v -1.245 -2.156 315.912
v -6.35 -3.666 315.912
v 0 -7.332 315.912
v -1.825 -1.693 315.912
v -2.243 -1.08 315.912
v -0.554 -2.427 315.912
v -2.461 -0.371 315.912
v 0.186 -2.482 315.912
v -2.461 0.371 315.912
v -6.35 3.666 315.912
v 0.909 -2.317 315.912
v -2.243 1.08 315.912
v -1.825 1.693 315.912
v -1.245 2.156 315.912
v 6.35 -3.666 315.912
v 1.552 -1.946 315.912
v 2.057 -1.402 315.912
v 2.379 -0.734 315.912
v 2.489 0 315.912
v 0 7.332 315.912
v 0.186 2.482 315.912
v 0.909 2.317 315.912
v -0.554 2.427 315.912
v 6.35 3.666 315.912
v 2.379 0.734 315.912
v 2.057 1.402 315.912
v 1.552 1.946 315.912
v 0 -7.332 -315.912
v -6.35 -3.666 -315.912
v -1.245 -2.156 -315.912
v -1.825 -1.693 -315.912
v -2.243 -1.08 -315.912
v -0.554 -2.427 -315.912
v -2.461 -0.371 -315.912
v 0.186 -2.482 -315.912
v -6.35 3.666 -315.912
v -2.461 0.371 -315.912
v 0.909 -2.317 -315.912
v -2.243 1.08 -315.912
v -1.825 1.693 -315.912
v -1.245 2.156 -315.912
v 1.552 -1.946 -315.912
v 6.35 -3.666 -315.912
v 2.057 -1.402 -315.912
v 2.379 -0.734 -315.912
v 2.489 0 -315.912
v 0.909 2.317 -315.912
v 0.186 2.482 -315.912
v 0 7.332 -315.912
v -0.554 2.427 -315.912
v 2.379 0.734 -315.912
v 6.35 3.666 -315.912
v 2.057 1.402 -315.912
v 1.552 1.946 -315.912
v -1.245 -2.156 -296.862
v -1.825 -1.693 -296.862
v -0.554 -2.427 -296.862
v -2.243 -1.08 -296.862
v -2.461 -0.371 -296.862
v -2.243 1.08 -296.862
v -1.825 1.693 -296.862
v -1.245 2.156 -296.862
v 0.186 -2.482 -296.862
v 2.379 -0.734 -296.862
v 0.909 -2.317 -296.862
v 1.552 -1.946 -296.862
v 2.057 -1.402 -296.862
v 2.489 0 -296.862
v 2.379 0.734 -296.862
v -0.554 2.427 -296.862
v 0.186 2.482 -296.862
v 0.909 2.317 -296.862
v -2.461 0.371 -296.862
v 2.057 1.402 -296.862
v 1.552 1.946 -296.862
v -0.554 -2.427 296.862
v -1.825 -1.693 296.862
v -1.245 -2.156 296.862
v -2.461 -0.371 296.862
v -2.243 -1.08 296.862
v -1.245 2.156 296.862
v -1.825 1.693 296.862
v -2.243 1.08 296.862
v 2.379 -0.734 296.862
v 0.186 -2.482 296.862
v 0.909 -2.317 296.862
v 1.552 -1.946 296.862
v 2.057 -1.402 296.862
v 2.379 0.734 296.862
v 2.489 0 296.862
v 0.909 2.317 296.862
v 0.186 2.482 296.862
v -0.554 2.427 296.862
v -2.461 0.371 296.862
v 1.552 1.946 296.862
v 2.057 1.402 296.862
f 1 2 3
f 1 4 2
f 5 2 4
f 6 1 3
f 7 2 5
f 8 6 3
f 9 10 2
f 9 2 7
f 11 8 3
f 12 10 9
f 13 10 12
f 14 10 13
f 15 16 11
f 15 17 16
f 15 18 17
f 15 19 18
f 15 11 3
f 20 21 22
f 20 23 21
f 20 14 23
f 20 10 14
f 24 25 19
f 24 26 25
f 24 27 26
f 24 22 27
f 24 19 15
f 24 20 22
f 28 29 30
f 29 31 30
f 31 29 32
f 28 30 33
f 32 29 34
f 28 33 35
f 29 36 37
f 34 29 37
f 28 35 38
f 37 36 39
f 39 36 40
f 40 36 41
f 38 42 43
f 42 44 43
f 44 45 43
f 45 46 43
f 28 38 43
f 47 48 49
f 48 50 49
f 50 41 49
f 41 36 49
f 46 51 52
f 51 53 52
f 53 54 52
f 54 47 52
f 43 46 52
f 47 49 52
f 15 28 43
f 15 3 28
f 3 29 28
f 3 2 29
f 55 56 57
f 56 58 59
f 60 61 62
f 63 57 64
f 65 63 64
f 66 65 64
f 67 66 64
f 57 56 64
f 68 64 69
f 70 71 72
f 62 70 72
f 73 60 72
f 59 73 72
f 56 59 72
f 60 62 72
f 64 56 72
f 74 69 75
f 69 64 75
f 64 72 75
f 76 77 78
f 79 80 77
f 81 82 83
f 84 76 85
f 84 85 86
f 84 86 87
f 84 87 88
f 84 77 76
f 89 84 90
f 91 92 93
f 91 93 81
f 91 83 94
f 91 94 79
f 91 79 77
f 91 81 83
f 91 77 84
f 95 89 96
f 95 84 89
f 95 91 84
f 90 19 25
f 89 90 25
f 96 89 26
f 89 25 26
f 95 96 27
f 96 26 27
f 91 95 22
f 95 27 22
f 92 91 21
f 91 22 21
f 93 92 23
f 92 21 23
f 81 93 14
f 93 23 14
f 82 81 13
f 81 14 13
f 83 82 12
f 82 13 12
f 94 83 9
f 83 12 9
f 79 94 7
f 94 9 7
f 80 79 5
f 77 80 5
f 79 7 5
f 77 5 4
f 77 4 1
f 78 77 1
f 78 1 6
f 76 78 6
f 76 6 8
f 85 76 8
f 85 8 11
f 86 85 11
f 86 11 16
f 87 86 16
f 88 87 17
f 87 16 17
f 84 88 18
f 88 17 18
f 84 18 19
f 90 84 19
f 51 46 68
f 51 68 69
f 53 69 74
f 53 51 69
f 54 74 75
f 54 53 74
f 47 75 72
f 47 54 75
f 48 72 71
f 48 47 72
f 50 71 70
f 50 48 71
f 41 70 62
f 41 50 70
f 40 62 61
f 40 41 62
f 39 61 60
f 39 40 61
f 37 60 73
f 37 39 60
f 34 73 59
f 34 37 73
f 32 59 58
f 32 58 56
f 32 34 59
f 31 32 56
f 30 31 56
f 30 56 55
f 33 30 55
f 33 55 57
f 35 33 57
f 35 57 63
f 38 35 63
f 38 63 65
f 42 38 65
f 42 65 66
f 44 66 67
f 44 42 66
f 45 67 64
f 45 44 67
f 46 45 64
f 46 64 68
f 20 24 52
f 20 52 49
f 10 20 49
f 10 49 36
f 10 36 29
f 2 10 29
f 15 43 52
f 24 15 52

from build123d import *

# Parameters (mm, degrees)
BOSS_EXTRUDE1_DEPTH = 315.9125
SKETCH2_R           = 2.4892
CUT_EXTRUDE1_DEPTH  = 19.05


with BuildPart() as part:
    # Sketch1 → Boss-Extrude1 (new, symmetric)
    with BuildSketch(Plane.XY):
        Polygon((6.35, -3.666174209), (6.35, 3.666174209), (0, 7.332348419), (-6.35, 3.666174209), (-6.35, -3.666174209), (0, -7.332348419), align=None)
    extrude(amount=BOSS_EXTRUDE1_DEPTH, both=True)

    # Sketch2 → Cut-Extrude1 (cut)
    with BuildSketch(Plane.XY.offset(315.9125)):
        Circle(SKETCH2_R)
    cut_extrude1 = extrude(amount=-CUT_EXTRUDE1_DEPTH, mode=Mode.SUBTRACT)

    # Mirror1: Cut-Extrude1 across plane
    add(cut_extrude1.mirror(Plane.XY), mode=Mode.SUBTRACT)


solid = part.part
